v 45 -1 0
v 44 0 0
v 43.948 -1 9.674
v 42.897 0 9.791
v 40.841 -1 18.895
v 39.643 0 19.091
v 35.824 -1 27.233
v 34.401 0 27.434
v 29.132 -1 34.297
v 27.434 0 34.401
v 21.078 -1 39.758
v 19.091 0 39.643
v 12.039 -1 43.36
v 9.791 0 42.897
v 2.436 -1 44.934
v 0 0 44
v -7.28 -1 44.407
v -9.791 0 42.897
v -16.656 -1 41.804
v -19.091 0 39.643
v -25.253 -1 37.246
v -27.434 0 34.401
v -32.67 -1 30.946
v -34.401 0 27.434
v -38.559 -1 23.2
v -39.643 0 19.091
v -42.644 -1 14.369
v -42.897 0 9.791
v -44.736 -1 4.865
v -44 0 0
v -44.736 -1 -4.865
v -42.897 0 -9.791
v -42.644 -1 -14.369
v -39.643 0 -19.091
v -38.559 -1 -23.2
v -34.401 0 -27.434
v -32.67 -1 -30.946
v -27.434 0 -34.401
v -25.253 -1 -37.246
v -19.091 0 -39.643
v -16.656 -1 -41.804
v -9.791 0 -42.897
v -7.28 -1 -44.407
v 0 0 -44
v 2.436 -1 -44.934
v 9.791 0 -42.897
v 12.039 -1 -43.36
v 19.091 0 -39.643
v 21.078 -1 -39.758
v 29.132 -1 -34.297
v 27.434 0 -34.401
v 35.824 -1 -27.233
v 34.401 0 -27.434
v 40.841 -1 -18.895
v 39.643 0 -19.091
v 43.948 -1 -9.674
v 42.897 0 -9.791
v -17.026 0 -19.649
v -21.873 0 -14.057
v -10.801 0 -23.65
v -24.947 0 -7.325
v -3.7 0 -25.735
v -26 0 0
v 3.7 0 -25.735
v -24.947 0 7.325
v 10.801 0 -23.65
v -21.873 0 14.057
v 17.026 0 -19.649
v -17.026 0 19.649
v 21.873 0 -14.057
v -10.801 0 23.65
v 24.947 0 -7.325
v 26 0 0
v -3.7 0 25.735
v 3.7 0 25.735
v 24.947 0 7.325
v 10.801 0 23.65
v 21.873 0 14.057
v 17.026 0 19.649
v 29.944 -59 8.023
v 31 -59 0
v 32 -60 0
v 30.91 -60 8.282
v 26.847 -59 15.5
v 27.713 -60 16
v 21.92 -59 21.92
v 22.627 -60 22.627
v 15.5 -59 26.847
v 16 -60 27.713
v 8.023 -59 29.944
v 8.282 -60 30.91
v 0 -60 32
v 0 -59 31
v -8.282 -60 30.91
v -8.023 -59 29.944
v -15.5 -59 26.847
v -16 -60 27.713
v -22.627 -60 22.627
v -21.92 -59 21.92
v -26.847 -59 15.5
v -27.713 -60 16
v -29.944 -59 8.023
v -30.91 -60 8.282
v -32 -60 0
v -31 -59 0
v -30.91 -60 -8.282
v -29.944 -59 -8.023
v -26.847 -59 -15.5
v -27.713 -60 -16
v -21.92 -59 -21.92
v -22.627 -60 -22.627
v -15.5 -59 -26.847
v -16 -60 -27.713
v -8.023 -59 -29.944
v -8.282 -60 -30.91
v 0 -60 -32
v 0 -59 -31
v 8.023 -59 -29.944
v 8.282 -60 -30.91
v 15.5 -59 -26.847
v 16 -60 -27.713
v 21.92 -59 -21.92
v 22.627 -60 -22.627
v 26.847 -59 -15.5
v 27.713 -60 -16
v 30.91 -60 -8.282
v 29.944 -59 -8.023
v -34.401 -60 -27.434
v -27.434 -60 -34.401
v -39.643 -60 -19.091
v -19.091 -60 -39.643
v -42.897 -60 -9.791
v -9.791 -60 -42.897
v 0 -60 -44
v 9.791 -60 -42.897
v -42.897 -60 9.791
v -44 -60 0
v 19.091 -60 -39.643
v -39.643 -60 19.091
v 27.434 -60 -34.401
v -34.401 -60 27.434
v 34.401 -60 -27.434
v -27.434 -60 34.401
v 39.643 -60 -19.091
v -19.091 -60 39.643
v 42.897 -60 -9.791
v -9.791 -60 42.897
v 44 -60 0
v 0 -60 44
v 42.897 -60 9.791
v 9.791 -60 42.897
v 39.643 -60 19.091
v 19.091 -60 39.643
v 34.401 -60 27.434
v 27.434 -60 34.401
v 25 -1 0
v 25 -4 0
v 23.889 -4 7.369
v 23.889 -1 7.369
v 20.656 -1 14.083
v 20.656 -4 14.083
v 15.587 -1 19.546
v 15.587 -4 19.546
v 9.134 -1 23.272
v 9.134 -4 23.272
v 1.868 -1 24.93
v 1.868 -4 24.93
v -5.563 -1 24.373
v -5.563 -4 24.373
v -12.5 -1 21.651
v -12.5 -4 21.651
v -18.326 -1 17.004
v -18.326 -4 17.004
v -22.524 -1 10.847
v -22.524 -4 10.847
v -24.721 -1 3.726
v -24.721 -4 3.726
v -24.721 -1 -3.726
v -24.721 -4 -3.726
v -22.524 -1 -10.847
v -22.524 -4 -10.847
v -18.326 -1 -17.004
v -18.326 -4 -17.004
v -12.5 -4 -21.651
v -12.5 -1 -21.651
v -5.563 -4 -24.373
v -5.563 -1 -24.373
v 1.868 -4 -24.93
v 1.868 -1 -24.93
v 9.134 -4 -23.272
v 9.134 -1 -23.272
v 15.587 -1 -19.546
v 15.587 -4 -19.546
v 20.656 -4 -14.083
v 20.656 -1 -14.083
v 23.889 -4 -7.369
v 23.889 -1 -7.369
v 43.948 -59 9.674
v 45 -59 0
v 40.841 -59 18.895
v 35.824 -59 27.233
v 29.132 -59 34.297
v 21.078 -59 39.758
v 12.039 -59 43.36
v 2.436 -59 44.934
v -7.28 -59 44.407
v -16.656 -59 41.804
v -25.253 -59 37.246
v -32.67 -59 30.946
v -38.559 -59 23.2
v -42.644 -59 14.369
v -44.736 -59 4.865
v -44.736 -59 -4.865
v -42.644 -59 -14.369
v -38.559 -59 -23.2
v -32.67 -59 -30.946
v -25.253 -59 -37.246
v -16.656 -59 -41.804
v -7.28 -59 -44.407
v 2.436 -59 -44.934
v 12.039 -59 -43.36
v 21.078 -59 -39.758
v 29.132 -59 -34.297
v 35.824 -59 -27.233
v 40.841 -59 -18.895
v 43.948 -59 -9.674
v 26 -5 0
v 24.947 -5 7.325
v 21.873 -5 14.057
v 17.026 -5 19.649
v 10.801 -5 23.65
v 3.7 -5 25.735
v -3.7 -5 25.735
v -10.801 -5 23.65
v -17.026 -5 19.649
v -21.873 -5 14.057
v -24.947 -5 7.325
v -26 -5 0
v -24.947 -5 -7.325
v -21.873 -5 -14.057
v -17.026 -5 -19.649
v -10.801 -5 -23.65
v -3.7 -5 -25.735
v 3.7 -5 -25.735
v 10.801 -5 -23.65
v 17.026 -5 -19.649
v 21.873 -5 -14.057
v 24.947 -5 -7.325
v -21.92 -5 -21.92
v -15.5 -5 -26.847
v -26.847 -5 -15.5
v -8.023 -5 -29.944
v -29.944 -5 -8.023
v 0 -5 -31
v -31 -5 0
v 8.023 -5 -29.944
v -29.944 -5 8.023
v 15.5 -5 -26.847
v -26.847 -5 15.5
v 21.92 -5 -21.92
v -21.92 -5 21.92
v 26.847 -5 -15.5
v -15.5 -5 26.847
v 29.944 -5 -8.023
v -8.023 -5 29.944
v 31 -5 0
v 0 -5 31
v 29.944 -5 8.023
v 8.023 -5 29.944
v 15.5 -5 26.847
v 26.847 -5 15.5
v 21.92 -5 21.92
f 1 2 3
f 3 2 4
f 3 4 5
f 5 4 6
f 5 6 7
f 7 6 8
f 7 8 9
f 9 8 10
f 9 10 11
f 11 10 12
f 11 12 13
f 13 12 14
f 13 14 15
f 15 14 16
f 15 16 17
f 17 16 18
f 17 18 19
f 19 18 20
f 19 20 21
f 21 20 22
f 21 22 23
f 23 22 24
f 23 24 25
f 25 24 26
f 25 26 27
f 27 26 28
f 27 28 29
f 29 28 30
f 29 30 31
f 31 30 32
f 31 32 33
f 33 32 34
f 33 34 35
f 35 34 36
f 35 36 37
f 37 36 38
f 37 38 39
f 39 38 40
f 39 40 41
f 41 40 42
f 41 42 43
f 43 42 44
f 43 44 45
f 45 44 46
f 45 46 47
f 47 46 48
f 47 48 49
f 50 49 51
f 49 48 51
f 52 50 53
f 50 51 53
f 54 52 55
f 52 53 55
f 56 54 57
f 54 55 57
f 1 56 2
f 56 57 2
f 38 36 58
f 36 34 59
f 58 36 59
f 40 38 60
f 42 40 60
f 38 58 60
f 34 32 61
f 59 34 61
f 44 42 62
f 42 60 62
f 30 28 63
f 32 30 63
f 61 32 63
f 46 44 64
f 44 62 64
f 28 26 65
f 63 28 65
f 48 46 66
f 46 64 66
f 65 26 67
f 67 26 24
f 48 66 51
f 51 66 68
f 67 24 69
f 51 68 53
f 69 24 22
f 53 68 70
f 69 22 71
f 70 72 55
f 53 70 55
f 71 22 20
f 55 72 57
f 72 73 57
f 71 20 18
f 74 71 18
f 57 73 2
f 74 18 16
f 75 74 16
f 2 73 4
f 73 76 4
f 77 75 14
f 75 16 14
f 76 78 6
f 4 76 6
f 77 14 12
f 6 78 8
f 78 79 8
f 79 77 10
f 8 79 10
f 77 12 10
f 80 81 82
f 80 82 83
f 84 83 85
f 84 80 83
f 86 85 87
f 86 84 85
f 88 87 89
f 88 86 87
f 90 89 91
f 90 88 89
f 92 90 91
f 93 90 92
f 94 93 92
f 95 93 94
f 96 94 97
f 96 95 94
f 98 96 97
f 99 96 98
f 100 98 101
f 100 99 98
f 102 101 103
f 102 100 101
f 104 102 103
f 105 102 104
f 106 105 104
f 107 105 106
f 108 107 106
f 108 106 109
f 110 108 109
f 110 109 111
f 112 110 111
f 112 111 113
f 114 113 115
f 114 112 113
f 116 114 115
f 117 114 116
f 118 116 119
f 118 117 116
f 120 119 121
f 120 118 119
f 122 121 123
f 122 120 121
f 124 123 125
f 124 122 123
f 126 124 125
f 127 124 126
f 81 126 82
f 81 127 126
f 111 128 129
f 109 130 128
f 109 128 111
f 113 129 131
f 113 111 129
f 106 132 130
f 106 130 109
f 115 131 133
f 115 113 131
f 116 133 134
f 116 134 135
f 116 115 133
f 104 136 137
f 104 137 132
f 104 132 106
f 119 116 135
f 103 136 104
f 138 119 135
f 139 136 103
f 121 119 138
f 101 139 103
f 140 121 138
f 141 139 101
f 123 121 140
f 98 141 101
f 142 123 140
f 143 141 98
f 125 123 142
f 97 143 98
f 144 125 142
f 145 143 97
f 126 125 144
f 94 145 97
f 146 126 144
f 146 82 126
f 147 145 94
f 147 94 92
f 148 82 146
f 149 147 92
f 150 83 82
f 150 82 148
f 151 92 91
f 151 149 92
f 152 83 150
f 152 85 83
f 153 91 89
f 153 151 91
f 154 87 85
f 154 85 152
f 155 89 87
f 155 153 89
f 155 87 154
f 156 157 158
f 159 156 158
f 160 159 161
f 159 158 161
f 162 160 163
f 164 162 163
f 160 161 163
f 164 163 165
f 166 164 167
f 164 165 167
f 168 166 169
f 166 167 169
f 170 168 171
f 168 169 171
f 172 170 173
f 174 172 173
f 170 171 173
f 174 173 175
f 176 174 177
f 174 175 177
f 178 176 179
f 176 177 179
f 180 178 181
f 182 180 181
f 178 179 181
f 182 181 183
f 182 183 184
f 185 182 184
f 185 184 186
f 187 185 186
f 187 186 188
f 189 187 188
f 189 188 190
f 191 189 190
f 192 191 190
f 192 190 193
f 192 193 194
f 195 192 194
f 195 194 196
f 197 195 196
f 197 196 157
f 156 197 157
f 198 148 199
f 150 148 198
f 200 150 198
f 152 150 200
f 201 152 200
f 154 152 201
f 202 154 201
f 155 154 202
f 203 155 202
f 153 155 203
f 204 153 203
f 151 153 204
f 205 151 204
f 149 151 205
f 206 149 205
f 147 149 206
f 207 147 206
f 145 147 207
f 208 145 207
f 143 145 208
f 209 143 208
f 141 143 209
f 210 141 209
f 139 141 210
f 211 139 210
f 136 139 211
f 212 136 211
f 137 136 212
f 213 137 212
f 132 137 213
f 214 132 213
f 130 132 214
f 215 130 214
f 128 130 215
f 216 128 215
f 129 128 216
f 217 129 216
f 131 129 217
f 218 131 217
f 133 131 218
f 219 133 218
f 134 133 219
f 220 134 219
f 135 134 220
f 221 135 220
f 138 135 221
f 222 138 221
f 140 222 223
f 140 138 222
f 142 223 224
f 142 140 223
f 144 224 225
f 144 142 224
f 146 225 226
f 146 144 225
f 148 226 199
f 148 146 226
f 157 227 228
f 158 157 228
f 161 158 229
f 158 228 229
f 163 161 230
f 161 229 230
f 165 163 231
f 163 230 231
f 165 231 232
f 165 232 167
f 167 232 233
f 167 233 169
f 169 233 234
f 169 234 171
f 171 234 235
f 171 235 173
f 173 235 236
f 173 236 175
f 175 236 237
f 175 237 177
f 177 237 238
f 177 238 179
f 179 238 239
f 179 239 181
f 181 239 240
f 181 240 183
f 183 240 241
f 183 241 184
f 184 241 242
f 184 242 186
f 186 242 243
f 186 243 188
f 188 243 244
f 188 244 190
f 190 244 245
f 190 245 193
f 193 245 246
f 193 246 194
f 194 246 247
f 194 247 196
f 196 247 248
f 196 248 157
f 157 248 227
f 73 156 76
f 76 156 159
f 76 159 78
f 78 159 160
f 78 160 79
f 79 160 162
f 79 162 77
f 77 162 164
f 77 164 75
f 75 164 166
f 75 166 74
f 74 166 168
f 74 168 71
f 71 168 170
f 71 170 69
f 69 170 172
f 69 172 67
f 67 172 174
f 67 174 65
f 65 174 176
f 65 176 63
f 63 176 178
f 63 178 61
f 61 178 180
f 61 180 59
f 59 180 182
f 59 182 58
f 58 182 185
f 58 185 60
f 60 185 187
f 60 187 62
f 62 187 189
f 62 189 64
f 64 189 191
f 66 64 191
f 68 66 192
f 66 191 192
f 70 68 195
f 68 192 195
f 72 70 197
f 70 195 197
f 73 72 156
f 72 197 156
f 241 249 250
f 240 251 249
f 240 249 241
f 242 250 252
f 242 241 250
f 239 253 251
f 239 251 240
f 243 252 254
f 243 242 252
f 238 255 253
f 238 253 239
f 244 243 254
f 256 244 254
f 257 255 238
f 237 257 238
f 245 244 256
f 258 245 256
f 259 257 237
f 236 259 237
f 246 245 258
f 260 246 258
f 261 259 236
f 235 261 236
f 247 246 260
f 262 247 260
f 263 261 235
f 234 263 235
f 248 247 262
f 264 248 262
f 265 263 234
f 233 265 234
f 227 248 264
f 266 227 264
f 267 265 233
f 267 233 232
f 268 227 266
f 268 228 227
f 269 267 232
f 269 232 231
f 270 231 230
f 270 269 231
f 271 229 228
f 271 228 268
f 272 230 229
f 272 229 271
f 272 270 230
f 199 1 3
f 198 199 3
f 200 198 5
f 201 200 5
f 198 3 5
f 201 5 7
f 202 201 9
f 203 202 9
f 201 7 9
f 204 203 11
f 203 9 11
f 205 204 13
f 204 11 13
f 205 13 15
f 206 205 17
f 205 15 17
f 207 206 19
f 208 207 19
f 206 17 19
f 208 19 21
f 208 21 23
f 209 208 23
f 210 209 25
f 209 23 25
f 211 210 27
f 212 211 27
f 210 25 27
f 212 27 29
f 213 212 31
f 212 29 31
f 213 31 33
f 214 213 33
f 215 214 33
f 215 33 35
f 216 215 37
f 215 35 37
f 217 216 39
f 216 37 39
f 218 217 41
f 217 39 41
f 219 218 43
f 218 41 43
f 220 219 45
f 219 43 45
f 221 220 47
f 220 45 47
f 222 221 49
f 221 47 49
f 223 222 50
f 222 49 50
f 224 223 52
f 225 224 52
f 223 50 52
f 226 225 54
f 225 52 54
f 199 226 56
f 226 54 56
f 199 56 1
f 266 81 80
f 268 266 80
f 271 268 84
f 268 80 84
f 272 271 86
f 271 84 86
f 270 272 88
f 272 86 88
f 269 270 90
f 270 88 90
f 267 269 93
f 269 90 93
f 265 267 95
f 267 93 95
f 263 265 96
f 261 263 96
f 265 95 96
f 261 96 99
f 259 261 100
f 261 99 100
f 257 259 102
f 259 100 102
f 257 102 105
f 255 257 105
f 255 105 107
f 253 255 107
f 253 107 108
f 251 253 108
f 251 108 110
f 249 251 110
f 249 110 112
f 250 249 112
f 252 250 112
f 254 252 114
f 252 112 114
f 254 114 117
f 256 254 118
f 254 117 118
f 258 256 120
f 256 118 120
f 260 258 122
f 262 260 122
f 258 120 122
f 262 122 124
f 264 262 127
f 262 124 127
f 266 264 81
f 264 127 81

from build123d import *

# Parameters (mm, degrees)
F0_R     = 45
F1_DEPTH = 60
F2_R     = 31
F3_DEPTH = 55
F4_R     = 25
F5_DEPTH = 25
F6_SIZE  = 1


with BuildPart() as f1:
    # F0 (on Front) → F1 (new body)
    with BuildSketch(Plane.XZ):
        Circle(F0_R)
    extrude(amount=F1_DEPTH)

    # F2 (on face) → F3 (cut)
    with BuildSketch(Plane.XZ.offset(60)):
        Circle(F2_R)
    extrude(amount=-F3_DEPTH, mode=Mode.SUBTRACT)

    # F4 (on face) → F5 (cut)
    with BuildSketch(Plane.XZ.offset(5)):
        Circle(F4_R)
    extrude(amount=-F5_DEPTH, mode=Mode.SUBTRACT)

    # F6
    f6_edges = [f1.edges().sort_by_distance(p)[0] for p in [
        (-45, -60, 0),
        (-31, -60, 0),
        (-45, 0, 0),
        (-25, 0, 0),
        (-25, -5, 0),
    ]]
    chamfer(f6_edges, length=F6_SIZE)


solid = f1.part
